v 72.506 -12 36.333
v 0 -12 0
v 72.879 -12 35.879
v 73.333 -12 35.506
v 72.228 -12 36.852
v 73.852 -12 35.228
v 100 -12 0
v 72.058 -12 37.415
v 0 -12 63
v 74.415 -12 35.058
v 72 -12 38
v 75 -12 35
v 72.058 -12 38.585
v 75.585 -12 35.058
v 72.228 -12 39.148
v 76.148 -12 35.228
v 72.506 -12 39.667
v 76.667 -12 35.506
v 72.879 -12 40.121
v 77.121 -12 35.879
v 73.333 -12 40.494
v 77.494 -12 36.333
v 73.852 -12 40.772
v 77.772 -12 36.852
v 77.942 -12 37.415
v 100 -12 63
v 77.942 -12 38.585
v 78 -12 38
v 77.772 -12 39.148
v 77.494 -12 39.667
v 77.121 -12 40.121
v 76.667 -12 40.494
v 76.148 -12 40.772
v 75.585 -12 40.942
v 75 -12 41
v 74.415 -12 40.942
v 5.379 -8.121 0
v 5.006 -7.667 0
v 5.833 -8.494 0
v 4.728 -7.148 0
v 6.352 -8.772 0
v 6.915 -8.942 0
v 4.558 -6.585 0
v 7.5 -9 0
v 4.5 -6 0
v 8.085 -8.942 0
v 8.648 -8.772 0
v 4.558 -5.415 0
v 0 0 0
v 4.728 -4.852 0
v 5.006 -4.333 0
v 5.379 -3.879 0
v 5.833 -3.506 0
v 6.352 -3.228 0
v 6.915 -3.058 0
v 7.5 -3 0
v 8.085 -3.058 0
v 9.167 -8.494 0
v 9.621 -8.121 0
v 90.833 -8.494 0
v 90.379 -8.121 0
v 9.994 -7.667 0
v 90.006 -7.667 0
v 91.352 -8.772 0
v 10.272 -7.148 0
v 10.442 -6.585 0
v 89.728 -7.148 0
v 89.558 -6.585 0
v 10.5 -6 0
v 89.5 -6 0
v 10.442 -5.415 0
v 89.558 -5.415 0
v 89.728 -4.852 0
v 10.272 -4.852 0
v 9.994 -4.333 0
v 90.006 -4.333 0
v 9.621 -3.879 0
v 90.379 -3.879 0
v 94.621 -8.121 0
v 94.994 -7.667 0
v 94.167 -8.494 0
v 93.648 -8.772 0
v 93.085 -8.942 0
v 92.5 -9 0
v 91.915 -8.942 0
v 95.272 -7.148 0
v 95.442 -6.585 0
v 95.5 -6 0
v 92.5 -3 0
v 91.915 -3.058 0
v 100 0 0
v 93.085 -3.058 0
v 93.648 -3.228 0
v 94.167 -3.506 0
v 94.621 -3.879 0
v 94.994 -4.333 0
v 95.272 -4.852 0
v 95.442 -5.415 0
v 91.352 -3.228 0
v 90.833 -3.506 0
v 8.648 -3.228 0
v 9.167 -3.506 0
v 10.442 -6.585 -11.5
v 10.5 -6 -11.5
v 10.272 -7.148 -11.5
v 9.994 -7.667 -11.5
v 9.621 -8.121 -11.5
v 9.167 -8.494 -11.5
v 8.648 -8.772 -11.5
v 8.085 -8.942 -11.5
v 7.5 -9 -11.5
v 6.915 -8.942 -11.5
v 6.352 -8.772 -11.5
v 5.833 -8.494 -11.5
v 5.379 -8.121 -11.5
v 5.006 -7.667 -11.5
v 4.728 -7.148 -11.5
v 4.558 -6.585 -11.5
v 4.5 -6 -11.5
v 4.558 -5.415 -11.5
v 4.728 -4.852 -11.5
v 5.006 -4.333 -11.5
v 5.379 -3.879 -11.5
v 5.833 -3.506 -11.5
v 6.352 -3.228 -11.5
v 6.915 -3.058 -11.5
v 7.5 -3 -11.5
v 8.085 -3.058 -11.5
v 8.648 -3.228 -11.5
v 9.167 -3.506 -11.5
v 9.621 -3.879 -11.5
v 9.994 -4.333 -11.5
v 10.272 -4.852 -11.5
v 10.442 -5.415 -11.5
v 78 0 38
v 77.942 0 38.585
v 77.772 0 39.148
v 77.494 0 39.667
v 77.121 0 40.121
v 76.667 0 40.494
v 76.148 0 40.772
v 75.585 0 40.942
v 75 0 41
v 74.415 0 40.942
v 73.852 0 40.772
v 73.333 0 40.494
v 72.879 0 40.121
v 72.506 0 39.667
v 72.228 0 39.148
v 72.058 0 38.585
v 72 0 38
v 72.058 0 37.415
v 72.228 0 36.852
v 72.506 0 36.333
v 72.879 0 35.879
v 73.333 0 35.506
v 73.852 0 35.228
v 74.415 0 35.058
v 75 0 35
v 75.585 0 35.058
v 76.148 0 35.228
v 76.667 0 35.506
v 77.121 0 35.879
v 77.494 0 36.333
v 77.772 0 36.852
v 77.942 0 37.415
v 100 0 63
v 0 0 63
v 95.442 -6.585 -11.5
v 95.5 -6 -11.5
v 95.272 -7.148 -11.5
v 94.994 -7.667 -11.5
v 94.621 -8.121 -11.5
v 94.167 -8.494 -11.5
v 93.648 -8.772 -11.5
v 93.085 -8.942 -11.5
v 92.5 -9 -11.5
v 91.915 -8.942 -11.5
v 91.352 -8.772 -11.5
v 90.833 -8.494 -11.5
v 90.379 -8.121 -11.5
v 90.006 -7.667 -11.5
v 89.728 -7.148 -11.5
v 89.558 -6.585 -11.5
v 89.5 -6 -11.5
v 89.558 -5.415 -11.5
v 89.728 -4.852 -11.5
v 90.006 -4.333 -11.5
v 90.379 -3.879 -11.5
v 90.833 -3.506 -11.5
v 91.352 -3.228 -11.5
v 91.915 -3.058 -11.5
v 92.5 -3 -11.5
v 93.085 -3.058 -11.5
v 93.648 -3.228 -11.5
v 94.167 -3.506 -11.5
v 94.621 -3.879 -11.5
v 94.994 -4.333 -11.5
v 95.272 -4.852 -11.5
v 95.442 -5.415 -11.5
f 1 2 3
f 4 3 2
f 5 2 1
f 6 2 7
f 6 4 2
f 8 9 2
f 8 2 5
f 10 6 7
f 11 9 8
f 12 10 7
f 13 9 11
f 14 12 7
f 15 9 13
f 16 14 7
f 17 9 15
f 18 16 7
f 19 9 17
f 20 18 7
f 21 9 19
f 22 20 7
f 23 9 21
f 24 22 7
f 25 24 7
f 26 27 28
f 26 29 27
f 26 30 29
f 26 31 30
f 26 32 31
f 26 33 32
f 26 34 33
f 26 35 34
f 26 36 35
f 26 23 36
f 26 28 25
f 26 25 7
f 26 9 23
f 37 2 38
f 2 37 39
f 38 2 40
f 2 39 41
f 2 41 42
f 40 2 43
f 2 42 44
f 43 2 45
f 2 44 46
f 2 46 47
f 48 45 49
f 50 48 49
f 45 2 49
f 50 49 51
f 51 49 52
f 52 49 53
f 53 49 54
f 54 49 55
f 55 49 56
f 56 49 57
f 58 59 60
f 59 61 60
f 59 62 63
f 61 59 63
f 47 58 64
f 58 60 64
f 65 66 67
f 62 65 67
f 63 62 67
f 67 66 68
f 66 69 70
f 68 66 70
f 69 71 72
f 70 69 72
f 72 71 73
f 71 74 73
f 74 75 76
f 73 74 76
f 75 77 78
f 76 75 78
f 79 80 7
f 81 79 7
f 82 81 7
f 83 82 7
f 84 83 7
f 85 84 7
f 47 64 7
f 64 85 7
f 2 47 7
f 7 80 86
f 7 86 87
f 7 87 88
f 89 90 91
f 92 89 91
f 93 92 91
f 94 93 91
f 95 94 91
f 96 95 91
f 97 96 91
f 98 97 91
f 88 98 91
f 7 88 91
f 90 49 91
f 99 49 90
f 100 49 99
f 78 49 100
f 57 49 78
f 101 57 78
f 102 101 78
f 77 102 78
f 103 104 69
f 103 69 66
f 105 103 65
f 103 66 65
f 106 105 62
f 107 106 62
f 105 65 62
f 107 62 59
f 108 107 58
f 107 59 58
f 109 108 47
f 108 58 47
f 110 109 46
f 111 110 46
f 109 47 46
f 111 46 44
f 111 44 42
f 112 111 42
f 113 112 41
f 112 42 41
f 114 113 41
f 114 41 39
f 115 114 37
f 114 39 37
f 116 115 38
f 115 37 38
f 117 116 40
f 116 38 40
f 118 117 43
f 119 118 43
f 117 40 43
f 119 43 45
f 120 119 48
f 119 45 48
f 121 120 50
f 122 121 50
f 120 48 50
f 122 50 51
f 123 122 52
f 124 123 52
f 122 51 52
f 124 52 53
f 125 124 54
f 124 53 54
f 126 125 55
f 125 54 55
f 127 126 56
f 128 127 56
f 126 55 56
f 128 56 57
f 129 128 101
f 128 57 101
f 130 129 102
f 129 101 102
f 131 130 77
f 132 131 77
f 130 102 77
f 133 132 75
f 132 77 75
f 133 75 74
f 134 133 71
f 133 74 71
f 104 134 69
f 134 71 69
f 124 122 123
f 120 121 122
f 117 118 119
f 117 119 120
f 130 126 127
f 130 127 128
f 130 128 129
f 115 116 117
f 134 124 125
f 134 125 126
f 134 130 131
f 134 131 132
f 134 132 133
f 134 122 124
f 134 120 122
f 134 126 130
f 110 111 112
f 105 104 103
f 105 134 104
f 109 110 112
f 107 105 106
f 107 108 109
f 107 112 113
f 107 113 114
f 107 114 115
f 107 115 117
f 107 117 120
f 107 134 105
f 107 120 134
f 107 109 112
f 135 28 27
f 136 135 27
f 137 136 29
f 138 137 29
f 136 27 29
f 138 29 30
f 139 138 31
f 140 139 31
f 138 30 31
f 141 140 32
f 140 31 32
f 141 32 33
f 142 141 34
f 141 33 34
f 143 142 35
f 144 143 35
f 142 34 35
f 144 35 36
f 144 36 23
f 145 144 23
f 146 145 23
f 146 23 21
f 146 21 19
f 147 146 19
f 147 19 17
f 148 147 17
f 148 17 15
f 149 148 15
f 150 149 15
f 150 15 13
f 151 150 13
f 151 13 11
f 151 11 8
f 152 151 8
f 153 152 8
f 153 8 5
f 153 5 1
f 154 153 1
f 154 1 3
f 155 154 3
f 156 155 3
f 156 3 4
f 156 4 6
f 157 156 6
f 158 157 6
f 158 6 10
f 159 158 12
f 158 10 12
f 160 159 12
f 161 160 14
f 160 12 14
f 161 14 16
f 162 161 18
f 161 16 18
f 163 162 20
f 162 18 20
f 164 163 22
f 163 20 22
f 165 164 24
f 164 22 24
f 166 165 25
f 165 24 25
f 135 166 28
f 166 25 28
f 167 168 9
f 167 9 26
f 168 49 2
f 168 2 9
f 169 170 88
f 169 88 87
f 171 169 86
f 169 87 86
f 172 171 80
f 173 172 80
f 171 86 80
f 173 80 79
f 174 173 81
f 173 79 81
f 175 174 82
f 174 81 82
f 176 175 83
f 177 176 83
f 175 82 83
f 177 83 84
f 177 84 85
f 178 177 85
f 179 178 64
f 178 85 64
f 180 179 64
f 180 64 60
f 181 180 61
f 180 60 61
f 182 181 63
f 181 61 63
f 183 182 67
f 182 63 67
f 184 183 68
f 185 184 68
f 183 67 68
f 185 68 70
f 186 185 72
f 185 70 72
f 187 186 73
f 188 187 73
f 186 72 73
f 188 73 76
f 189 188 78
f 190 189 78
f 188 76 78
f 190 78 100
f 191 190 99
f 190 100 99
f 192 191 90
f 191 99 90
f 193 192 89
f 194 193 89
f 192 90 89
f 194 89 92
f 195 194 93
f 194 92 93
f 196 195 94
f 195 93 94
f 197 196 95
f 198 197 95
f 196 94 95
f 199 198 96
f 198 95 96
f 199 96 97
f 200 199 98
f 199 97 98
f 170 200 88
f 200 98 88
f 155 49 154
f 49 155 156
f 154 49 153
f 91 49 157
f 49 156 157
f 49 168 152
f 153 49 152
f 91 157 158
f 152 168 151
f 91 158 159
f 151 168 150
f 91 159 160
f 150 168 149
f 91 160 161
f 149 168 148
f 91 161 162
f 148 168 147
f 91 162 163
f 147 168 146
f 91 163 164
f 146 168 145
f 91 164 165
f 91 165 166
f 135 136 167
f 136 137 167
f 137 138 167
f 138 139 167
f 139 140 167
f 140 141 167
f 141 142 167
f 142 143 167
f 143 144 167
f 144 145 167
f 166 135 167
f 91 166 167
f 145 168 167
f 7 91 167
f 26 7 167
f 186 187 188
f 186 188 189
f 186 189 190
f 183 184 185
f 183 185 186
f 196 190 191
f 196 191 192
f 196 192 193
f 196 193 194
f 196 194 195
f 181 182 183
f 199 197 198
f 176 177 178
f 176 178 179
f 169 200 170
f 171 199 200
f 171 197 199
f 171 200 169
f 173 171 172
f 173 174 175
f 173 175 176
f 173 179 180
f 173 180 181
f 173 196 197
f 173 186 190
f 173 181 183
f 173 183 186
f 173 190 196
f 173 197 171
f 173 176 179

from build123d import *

# Parameters (mm, degrees)
F0_W     = 100
F0_H     = 63
F1_DEPTH = 12
F2_R     = 3
F3_DEPTH = 11.5
F4_R     = 3
F5_DEPTH = 12.001


with BuildPart() as f1:
    # F0 (on Front) → F1 (new body)
    with BuildSketch(Plane.XZ):
        with Locations((50, 31.5)):
            Rectangle(F0_W, F0_H)
    extrude(amount=F1_DEPTH)

    # F2 (on face) → F3 (join)
    with BuildSketch(Plane(origin=(0, 0, 0), x_dir=(1, 0, 0), z_dir=(0, 0, -1))):
        with Locations((7.5, 6)):
            Circle(F2_R)
        with Locations((92.5, 6)):
            Circle(F2_R)
    extrude(amount=F3_DEPTH)

    # F4 (on face) → F5 (cut, through all)
    with BuildSketch(Plane.XZ.offset(12)):
        with Locations((75, 38)):
            Circle(F4_R)
    extrude(amount=-F5_DEPTH, mode=Mode.SUBTRACT)


solid = f1.part
